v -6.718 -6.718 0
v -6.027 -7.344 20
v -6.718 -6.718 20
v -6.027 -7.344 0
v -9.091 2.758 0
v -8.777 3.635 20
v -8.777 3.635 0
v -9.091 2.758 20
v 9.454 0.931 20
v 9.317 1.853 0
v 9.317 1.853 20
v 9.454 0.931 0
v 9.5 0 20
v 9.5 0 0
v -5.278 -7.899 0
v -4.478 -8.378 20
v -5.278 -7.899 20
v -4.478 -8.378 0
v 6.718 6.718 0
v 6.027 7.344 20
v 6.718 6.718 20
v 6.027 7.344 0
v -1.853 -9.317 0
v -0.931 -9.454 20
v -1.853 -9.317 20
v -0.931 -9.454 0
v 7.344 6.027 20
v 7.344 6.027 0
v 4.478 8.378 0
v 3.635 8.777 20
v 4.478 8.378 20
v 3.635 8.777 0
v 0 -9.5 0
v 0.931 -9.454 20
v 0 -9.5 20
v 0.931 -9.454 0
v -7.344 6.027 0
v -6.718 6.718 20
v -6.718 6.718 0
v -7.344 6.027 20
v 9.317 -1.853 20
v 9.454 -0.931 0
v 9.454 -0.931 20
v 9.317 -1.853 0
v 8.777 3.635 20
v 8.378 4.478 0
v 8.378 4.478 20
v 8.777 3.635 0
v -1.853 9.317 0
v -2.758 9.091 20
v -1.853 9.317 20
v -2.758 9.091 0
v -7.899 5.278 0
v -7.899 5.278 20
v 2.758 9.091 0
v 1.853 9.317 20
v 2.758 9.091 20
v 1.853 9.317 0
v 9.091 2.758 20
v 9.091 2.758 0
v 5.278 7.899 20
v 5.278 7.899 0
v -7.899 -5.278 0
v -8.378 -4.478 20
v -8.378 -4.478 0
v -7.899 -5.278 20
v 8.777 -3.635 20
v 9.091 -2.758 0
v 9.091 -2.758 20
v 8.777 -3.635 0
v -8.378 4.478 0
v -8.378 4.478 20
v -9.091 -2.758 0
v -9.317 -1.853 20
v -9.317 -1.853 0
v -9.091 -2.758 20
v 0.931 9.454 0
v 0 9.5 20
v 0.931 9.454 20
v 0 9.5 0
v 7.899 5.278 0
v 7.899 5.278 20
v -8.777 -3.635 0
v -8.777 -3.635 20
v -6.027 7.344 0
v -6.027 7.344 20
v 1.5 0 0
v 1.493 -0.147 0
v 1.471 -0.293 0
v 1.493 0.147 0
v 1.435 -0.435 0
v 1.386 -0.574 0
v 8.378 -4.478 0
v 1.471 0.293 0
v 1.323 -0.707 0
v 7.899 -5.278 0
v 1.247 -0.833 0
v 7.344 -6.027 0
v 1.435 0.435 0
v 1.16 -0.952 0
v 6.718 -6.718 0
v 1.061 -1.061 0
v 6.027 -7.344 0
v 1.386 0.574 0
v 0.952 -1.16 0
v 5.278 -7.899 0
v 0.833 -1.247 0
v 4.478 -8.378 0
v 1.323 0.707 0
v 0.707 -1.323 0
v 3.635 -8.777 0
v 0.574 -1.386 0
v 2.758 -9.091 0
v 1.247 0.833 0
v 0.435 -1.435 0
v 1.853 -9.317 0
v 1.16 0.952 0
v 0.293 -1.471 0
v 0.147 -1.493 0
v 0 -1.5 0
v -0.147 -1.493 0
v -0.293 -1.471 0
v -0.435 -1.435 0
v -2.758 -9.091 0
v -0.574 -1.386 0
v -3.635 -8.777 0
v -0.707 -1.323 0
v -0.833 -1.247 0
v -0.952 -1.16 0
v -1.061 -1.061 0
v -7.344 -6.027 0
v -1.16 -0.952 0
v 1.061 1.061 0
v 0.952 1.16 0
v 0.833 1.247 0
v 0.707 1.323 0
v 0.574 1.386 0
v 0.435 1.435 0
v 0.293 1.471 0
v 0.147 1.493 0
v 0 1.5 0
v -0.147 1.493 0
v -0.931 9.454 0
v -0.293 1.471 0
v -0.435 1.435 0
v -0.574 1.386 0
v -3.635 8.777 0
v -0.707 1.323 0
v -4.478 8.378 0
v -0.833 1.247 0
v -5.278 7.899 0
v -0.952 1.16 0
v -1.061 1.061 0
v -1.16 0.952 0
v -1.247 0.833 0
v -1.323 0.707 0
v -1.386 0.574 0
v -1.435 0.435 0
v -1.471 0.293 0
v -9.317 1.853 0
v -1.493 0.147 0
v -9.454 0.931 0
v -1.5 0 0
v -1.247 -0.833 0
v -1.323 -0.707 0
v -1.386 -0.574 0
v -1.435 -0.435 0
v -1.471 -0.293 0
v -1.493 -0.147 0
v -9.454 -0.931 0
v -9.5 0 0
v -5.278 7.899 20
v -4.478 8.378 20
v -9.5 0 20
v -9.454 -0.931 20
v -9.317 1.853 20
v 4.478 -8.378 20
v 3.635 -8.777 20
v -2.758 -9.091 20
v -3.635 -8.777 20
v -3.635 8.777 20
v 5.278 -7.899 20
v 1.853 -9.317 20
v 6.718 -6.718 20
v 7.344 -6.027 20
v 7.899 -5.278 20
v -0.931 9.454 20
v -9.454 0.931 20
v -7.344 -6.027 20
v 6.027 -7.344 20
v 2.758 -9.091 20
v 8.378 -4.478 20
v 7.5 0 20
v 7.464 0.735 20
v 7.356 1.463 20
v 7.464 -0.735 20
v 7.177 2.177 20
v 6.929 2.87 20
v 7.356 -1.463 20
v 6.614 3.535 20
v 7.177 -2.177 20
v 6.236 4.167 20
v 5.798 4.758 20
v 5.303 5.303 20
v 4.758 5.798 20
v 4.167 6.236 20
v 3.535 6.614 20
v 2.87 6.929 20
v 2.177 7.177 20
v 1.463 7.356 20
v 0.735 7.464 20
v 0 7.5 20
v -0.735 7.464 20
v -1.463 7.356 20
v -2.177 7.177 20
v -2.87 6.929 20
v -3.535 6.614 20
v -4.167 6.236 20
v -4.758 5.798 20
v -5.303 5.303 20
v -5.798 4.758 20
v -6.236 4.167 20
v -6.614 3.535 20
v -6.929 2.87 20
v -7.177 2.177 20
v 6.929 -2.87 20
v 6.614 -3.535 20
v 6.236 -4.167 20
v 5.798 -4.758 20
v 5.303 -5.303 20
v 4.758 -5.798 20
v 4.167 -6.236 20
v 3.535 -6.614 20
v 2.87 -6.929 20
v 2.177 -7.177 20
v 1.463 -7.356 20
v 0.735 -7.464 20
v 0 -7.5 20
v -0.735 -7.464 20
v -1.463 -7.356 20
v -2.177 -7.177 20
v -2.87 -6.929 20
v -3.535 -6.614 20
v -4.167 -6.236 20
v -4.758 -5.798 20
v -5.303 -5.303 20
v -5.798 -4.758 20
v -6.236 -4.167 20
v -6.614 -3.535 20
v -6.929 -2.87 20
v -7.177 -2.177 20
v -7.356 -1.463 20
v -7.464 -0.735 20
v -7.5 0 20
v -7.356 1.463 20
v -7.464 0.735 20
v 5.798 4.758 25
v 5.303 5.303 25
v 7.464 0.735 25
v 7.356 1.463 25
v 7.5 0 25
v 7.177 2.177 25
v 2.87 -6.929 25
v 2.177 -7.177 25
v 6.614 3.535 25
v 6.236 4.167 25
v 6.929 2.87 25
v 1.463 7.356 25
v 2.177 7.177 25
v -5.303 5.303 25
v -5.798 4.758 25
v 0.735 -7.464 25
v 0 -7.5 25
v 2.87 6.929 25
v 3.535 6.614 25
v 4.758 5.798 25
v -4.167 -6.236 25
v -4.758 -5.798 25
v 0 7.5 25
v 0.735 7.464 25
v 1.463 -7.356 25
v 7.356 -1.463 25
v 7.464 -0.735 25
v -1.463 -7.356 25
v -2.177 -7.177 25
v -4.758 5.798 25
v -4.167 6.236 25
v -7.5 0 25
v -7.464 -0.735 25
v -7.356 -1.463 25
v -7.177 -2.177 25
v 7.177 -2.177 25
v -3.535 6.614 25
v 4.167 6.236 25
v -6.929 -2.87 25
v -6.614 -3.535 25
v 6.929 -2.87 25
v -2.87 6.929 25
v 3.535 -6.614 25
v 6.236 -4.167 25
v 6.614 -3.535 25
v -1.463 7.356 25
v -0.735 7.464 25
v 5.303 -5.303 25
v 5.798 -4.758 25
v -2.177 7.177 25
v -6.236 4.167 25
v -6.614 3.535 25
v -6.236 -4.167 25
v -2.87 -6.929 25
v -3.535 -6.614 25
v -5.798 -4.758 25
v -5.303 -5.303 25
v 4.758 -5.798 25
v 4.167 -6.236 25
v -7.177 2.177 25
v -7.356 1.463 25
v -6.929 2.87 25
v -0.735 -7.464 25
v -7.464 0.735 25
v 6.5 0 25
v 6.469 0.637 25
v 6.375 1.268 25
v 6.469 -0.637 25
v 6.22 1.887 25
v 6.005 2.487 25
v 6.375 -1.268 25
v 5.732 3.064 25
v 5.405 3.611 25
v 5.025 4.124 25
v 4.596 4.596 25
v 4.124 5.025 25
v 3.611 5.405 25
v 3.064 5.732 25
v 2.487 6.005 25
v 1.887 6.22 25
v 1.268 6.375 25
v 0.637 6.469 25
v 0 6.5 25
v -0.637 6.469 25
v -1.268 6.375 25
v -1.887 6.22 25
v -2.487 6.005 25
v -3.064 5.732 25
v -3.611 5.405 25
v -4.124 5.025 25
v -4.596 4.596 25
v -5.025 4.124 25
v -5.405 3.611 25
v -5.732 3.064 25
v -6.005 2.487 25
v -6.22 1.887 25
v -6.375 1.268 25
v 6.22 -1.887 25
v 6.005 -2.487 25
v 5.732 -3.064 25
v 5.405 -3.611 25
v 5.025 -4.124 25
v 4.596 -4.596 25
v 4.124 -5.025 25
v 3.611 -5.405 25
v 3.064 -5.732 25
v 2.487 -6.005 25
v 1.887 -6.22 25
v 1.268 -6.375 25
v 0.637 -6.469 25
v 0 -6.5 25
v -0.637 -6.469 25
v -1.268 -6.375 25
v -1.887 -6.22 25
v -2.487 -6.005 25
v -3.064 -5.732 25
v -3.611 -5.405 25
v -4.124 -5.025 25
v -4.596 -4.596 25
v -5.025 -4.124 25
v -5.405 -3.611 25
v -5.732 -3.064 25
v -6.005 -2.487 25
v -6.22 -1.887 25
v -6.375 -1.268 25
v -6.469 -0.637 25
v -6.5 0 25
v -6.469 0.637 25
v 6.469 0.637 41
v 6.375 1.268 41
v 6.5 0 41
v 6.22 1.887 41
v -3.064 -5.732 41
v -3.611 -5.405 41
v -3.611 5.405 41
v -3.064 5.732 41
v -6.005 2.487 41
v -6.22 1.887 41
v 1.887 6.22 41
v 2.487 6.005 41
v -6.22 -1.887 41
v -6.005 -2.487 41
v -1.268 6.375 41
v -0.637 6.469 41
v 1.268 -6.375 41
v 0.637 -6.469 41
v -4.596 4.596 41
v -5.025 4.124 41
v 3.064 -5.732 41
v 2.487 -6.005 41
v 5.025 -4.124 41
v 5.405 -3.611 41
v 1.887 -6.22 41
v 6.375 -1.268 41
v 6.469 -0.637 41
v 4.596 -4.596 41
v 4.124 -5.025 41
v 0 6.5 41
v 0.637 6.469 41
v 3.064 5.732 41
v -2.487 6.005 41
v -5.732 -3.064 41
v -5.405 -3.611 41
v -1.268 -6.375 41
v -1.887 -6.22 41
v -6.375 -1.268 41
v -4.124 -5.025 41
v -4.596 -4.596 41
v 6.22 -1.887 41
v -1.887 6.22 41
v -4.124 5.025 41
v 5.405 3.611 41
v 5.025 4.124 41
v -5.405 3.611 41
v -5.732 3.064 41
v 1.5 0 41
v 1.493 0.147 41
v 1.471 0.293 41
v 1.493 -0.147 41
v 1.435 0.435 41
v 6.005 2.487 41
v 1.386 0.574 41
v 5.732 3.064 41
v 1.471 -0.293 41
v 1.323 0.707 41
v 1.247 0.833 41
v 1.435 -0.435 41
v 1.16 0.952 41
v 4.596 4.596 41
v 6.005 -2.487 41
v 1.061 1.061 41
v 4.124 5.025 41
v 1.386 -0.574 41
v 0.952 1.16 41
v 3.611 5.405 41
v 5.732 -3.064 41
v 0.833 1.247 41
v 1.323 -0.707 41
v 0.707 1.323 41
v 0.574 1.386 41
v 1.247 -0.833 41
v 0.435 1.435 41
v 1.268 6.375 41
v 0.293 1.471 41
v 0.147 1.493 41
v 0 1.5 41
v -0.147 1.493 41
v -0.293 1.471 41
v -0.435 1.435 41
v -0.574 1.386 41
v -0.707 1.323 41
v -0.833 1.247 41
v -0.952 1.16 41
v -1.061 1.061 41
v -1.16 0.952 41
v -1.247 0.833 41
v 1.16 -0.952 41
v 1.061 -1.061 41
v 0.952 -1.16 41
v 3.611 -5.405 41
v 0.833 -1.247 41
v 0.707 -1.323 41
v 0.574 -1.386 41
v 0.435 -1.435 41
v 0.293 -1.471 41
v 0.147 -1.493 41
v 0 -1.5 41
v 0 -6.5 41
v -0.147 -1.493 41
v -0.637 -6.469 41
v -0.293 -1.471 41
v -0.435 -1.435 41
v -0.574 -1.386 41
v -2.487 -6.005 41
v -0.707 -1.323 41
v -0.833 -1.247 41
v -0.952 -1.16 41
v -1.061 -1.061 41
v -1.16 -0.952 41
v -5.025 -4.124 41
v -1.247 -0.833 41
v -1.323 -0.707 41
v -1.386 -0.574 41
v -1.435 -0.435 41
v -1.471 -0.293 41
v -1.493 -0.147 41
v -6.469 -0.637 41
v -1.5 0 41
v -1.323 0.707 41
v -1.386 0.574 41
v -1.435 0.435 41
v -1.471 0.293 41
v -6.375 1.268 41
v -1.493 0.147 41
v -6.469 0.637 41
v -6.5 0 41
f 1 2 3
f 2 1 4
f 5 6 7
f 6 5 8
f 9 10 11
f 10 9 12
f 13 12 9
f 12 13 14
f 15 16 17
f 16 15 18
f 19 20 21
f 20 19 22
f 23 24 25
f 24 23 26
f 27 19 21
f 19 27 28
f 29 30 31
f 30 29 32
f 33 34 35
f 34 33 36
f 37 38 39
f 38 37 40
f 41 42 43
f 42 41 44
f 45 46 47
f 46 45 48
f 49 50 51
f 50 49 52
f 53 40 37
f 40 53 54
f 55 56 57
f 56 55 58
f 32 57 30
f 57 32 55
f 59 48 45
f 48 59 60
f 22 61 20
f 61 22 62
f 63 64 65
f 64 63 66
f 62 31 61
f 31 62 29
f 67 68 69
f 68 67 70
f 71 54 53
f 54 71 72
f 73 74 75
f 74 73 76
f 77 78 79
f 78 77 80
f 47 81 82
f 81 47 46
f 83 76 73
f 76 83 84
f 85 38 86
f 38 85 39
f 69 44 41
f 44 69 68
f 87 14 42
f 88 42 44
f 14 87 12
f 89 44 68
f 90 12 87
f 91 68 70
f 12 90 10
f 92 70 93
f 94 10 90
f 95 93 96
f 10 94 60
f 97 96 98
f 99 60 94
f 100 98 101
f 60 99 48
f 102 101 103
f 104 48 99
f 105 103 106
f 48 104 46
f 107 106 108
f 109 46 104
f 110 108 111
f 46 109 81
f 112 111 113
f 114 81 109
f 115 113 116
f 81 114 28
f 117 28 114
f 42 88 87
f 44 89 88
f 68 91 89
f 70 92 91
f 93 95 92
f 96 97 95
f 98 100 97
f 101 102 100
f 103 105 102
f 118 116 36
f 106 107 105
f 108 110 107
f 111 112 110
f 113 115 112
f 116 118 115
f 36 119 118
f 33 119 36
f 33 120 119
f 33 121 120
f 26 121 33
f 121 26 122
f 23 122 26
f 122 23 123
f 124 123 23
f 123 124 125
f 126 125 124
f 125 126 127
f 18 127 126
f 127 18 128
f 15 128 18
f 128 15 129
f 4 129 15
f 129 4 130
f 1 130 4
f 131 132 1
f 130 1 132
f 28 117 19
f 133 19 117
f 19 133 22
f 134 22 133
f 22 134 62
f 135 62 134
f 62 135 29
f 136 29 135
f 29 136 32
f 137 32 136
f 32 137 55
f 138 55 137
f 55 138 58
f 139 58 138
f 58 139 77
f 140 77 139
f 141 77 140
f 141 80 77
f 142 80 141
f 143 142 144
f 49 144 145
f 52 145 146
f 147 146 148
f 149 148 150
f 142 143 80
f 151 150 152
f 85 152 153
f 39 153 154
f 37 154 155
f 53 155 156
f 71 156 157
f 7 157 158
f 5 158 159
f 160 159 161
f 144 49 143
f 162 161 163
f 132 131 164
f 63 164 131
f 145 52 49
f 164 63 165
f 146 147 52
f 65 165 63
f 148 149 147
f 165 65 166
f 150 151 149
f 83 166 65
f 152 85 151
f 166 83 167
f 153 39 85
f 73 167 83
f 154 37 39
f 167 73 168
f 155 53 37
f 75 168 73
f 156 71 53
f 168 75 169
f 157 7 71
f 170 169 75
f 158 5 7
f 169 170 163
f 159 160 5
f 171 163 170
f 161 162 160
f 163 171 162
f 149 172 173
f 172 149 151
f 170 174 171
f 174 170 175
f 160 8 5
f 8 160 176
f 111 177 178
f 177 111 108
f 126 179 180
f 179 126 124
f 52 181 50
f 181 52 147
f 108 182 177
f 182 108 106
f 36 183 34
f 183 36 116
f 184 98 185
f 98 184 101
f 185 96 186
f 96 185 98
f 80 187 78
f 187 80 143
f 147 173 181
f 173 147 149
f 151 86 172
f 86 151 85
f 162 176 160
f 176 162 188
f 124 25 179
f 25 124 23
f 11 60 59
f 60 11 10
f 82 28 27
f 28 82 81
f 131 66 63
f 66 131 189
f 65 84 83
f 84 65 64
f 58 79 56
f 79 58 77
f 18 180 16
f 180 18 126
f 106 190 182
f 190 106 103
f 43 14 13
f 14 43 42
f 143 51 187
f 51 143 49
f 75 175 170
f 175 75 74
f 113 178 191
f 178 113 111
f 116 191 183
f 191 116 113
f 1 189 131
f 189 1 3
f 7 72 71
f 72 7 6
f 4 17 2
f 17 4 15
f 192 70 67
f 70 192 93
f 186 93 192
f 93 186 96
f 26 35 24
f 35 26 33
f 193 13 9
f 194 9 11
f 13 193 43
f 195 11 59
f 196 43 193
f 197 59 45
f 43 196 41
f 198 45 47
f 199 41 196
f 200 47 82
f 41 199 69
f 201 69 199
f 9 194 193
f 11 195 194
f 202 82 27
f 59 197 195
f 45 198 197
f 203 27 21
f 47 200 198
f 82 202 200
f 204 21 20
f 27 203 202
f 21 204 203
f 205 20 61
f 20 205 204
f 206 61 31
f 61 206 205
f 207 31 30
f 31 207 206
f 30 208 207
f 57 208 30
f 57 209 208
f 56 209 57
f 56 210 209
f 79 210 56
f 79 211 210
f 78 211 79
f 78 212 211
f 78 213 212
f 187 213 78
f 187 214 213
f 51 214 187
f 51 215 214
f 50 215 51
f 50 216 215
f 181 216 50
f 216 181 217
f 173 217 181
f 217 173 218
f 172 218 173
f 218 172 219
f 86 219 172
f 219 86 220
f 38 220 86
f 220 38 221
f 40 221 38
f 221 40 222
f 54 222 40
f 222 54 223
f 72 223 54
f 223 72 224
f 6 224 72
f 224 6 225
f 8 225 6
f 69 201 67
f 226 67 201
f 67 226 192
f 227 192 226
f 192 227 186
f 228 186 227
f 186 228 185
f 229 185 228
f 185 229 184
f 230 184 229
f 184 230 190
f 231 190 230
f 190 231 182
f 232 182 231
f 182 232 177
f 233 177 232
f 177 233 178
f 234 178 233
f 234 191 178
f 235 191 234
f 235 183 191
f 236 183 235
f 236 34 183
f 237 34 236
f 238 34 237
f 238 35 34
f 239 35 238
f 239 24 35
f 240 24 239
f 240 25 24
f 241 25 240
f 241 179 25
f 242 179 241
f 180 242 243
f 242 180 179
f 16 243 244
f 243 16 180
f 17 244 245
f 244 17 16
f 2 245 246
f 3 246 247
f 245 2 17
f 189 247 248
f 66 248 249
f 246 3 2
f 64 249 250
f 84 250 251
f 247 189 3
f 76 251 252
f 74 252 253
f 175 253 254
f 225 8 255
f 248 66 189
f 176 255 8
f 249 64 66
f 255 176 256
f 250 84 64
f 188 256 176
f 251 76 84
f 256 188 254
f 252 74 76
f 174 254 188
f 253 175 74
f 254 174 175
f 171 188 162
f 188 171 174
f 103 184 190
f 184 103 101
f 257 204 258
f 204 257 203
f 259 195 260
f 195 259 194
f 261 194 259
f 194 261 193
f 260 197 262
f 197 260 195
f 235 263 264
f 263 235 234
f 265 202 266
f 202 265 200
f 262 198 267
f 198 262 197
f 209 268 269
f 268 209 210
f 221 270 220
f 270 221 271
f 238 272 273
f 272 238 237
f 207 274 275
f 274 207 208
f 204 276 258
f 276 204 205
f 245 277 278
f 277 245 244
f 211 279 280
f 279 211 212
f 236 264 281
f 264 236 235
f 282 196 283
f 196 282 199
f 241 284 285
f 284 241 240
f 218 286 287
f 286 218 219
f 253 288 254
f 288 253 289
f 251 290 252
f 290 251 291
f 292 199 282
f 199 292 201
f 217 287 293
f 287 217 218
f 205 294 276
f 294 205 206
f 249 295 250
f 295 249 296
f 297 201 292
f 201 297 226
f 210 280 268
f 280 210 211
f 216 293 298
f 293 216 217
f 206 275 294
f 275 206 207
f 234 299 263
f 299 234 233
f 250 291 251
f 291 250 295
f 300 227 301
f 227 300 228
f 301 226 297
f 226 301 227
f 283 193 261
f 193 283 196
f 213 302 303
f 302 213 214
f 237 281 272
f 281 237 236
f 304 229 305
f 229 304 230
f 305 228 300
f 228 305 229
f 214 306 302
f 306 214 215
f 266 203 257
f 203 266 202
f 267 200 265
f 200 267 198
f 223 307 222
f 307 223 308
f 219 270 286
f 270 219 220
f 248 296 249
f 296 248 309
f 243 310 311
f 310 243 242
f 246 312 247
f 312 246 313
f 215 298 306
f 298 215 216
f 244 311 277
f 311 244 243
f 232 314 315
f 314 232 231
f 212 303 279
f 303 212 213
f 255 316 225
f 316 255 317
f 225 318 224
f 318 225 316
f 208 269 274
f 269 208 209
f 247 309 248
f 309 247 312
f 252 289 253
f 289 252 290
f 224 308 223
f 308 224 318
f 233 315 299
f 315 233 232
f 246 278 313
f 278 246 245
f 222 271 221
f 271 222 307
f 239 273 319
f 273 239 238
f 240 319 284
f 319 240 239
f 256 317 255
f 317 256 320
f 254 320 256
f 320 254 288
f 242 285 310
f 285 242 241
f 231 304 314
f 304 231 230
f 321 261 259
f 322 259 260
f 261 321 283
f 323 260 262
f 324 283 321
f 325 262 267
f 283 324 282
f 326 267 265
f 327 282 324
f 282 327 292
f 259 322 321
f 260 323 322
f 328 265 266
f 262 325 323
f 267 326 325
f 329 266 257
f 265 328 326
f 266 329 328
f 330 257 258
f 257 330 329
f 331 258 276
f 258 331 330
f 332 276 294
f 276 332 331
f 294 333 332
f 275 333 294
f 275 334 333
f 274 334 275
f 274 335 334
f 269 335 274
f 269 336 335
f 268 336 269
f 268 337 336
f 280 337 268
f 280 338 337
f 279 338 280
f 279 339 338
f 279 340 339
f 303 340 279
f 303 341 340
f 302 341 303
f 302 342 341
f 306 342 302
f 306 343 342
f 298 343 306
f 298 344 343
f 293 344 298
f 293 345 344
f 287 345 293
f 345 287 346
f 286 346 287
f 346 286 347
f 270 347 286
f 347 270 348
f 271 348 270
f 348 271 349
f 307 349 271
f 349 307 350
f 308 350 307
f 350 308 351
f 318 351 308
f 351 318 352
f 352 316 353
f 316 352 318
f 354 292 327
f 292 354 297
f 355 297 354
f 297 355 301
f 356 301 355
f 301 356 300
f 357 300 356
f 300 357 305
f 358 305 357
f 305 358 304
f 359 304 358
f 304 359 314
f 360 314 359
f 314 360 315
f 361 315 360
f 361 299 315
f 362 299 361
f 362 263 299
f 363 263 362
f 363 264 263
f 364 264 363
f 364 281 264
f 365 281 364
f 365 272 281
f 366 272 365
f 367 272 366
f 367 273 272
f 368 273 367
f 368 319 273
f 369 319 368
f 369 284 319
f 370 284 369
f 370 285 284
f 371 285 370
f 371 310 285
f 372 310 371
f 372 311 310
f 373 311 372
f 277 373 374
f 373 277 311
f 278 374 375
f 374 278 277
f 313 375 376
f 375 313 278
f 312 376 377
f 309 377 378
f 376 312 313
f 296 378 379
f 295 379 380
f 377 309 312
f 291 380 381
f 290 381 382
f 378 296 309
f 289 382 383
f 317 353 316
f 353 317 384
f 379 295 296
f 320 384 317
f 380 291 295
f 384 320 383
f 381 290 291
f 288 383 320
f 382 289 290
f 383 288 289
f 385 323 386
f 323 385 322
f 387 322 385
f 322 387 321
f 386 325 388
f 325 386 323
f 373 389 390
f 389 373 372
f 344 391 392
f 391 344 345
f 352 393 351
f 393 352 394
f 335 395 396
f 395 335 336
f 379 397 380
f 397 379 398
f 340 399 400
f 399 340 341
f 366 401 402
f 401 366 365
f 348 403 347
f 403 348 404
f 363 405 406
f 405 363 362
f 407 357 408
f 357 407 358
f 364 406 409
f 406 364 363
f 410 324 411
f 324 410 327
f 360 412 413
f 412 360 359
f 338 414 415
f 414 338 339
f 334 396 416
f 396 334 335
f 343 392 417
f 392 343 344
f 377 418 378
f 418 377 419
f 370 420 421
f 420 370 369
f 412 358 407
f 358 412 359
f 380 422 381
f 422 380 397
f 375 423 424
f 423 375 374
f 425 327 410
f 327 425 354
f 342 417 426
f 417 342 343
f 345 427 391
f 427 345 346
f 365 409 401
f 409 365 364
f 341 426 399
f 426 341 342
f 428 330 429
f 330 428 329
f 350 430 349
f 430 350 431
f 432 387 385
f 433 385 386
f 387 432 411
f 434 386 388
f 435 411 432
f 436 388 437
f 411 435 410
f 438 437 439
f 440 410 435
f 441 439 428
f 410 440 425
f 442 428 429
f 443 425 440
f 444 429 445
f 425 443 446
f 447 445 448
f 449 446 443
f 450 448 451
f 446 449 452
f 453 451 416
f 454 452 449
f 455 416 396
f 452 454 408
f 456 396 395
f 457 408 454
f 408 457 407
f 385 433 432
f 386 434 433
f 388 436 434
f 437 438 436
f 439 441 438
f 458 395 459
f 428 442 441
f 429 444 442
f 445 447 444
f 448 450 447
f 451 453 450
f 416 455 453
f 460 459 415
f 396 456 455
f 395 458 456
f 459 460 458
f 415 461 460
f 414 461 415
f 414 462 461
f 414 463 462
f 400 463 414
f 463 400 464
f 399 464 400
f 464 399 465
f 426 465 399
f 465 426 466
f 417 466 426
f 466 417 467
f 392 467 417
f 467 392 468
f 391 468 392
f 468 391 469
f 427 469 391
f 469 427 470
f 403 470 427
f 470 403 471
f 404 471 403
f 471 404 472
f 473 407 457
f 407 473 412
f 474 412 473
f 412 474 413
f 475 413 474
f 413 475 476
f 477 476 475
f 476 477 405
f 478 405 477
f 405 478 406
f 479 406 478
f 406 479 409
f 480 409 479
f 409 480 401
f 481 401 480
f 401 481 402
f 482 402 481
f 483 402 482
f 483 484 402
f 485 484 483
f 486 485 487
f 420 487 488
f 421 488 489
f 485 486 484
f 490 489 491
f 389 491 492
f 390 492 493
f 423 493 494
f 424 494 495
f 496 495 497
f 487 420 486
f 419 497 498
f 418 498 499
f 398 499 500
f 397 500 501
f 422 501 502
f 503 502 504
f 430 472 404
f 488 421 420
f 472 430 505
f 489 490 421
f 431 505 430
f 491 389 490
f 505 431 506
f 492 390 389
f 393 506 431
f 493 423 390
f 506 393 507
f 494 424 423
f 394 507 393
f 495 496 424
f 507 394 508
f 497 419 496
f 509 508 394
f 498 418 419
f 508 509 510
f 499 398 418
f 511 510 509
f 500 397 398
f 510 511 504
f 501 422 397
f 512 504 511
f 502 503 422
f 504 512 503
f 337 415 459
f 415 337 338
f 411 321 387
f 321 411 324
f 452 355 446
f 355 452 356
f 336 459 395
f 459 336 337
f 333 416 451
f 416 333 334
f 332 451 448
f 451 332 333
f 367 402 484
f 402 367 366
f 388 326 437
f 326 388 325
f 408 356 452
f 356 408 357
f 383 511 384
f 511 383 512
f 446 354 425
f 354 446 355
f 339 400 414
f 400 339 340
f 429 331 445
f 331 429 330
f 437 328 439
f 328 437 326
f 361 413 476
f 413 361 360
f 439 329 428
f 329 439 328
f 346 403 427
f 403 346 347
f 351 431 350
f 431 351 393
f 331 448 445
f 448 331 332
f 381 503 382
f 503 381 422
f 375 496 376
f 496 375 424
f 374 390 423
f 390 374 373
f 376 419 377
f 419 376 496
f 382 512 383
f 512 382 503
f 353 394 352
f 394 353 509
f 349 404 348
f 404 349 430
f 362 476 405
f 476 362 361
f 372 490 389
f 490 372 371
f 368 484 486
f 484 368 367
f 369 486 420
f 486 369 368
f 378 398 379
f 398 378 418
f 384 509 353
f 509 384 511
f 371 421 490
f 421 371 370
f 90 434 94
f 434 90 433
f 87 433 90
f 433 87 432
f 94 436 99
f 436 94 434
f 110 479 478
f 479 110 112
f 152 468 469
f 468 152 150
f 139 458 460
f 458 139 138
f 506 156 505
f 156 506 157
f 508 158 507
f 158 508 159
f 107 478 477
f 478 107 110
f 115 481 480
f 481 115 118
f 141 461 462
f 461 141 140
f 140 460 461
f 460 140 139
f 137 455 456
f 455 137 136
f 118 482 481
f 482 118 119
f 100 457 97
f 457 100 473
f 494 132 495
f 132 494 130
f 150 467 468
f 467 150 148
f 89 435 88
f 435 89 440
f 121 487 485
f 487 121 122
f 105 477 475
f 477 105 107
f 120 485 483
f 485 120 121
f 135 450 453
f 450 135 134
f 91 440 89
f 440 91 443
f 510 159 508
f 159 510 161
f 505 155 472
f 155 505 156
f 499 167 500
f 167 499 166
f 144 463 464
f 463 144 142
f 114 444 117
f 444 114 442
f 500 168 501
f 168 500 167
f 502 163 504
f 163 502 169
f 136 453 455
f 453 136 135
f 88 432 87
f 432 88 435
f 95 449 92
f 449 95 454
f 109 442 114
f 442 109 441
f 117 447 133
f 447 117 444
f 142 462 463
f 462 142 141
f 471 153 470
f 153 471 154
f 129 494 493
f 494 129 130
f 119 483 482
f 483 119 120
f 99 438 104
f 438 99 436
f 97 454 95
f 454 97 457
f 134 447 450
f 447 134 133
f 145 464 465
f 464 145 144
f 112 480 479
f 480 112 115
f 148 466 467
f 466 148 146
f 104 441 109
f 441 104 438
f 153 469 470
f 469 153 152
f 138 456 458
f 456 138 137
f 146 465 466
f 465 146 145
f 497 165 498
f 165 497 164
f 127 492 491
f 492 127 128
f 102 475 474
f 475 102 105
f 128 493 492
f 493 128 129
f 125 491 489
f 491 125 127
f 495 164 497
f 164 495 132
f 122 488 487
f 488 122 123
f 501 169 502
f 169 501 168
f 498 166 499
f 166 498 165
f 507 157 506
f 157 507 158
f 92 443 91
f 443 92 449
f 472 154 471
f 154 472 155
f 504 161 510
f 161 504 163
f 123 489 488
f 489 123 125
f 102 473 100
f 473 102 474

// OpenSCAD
$fn = 64;

// --- Dimensions (mm) ---
// Bore (inner diameter)
bore_diameter = 3.0;

// --- 8 mm Tubing Section (z = 0 to 20) ---
// Barb 1 (Bottom)
barb1_height = 10.0;
barb1_od_bottom = 7.5;
barb1_od_top = 9.5;
barb1_od_step = 7.5; // Steps back to this diameter

// --- Transition Section (z = 20 to 25) ---
collar_diameter = 12.0;
collar_height = 5.0;

// --- 5 mm Tubing Section (z = 25 to 41) ---
// Barb 2 (Top)
barb2_height = 8.0;
barb2_od_bottom = 6.5;
barb2_od_top = 5.0;
barb2_od_step = 6.5; // Steps back to this diameter

// --- Geometry Generation ---

// 1. Main Body (Cylinder with Bore)
module main_body() {
    union() {
        // Section 1: Bottom 8mm Barbs (z = 0 to 20)
        // Outer diameter is the top of the bottom barb (9.5 mm)
        translate([0, 0, 0])
        cylinder(h = 20, r = 9.5, $fn = 64);
        
        // Section 2: Transition Collar (z = 20 to 25)
        // Outer diameter is the step of the bottom barb (7.5 mm)
        // Inner diameter is the top of the top barb (5.0 mm)
        translate([0, 0, 20])
        cylinder(h = collar_height, r = 7.5, $fn = 64);
        
        // Section 3: Top 5mm Barbs (z = 25 to 41)
        // Outer diameter is the step of the top barb (6.5 mm)
        translate([0, 0, 25])
        cylinder(h = 16, r = 6.5, $fn = 64);
    }
}

module inner_bore() {
    // The bore is a straight cylinder through the full length
    cylinder(h = 41, r = bore_diameter / 2, $fn = 64);
}

// 2. Sawtooth Barbs
// Generates a single sawtooth profile: Linear ramp up, then step down
module sawtooth_barb(z_start, height, od_bottom, od_top, od_step) {
    // The linear ramp (bottom to top)
    // We use a cylinder with a linearly interpolated radius
    // To do this in OpenSCAD without CSG hacks, we use a linear_extrude
    // of a polygon that interpolates the radius.
    
    // Calculate radius at top
    r_top = od_top / 2;
    r_bottom = od_bottom / 2;
    
    // Create a polygon for the cross section
    // We use a polygon with 4 points: Bottom-Left, Top-Left, Top-Right, Bottom-Right
    // The X coordinates represent the radius at that Z height.
    // We need to scale the polygon in X based on the Z height.
    
    // However, linear_extrude scales the whole shape. 
    // To get a linear change in radius, we can use a polygon with a varying X coordinate
    // and scale it in X using the 'scale' vector in linear_extrude.
    
    // Let's define the shape in 2D (y is up, x is out)
    // We want the radius to go from r_bottom to r_top over 'height'.
    // We can use a polygon that is a trapezoid, then scale it in X.
    
    // Shape: A trapezoid where the top edge is shorter than the bottom edge.
    // But we need to scale it so the top edge becomes r_top.
    // Let's define the shape with a top edge of length 2*r_top.
    // Then we scale it in X by (r_bottom / r_top).
    
    // Wait, simpler approach: 
    // Use a cylinder for the ramp, and a cylinder for the step.
    
    // Ramp (Linear growth)
    // We can't easily make a cylinder with a changing radius in one go.
    // We can use a polygon and linear_extrude with a scale vector.
    
    // Polygon points (relative to center):
    // 0,0 (bottom center)
    // 0, height (top center)
    // r_top, height (top edge)
    // r_bottom, 0 (bottom edge)
    
    // We need to scale this shape in X so that the bottom edge becomes r_bottom.
    // Scale factor = r_bottom / r_top.
    
    scale_factor = r_bottom / r_top;
    
    linear_extrude(height = height, scale = scale_factor) {
        polygon([
            [0, 0],
            [0, 1],
            [r_top, 1],
            [r_bottom, 0]
        ]);
    }
    
    // Step (Straight back to bottom diameter)
    // We add a cylinder on top of the ramp.
    // The ramp ends at z_start + height.
    // The step starts at z_start + height.
    // The step height is small (e.g., 0.1 mm) to ensure a solid connection.
    
    step_height = 0.1;
    
    translate([0, 0, height])
    cylinder(h = step_height, r = od_step / 2, $fn = 64);
}

// 3. Assembly
// Render the part
difference() {
    main_body();
    inner_bore();
}

// 4. Add Barbs
// We add the barbs to the main body.
// We need to add them to the 'main_body' module or union them.
// Since we are using difference, we can just union the barbs with the main body
// before subtracting the bore.

module full_part() {
    difference() {
        union() {
            main_body();
            
            // Add Bottom Barbs (z = 0 to 10)
            // We place them at z=0.
            // The module draws from z=0 to z=height.
            translate([0, 0, 0])
            sawtooth_barb(0, barb1_height, barb1_od_bottom, barb1_od_top, barb1_od_step);
            
            // Add Top Barbs (z = 25 to 33)
            // We place them at z=25.
            translate([0, 0, 25])
            sawtooth_barb(0, barb2_height, barb2_od_bottom, barb2_od_top, barb2_od_step);
        }
        inner_bore();
    }
}

// Render the final part
full_part();
